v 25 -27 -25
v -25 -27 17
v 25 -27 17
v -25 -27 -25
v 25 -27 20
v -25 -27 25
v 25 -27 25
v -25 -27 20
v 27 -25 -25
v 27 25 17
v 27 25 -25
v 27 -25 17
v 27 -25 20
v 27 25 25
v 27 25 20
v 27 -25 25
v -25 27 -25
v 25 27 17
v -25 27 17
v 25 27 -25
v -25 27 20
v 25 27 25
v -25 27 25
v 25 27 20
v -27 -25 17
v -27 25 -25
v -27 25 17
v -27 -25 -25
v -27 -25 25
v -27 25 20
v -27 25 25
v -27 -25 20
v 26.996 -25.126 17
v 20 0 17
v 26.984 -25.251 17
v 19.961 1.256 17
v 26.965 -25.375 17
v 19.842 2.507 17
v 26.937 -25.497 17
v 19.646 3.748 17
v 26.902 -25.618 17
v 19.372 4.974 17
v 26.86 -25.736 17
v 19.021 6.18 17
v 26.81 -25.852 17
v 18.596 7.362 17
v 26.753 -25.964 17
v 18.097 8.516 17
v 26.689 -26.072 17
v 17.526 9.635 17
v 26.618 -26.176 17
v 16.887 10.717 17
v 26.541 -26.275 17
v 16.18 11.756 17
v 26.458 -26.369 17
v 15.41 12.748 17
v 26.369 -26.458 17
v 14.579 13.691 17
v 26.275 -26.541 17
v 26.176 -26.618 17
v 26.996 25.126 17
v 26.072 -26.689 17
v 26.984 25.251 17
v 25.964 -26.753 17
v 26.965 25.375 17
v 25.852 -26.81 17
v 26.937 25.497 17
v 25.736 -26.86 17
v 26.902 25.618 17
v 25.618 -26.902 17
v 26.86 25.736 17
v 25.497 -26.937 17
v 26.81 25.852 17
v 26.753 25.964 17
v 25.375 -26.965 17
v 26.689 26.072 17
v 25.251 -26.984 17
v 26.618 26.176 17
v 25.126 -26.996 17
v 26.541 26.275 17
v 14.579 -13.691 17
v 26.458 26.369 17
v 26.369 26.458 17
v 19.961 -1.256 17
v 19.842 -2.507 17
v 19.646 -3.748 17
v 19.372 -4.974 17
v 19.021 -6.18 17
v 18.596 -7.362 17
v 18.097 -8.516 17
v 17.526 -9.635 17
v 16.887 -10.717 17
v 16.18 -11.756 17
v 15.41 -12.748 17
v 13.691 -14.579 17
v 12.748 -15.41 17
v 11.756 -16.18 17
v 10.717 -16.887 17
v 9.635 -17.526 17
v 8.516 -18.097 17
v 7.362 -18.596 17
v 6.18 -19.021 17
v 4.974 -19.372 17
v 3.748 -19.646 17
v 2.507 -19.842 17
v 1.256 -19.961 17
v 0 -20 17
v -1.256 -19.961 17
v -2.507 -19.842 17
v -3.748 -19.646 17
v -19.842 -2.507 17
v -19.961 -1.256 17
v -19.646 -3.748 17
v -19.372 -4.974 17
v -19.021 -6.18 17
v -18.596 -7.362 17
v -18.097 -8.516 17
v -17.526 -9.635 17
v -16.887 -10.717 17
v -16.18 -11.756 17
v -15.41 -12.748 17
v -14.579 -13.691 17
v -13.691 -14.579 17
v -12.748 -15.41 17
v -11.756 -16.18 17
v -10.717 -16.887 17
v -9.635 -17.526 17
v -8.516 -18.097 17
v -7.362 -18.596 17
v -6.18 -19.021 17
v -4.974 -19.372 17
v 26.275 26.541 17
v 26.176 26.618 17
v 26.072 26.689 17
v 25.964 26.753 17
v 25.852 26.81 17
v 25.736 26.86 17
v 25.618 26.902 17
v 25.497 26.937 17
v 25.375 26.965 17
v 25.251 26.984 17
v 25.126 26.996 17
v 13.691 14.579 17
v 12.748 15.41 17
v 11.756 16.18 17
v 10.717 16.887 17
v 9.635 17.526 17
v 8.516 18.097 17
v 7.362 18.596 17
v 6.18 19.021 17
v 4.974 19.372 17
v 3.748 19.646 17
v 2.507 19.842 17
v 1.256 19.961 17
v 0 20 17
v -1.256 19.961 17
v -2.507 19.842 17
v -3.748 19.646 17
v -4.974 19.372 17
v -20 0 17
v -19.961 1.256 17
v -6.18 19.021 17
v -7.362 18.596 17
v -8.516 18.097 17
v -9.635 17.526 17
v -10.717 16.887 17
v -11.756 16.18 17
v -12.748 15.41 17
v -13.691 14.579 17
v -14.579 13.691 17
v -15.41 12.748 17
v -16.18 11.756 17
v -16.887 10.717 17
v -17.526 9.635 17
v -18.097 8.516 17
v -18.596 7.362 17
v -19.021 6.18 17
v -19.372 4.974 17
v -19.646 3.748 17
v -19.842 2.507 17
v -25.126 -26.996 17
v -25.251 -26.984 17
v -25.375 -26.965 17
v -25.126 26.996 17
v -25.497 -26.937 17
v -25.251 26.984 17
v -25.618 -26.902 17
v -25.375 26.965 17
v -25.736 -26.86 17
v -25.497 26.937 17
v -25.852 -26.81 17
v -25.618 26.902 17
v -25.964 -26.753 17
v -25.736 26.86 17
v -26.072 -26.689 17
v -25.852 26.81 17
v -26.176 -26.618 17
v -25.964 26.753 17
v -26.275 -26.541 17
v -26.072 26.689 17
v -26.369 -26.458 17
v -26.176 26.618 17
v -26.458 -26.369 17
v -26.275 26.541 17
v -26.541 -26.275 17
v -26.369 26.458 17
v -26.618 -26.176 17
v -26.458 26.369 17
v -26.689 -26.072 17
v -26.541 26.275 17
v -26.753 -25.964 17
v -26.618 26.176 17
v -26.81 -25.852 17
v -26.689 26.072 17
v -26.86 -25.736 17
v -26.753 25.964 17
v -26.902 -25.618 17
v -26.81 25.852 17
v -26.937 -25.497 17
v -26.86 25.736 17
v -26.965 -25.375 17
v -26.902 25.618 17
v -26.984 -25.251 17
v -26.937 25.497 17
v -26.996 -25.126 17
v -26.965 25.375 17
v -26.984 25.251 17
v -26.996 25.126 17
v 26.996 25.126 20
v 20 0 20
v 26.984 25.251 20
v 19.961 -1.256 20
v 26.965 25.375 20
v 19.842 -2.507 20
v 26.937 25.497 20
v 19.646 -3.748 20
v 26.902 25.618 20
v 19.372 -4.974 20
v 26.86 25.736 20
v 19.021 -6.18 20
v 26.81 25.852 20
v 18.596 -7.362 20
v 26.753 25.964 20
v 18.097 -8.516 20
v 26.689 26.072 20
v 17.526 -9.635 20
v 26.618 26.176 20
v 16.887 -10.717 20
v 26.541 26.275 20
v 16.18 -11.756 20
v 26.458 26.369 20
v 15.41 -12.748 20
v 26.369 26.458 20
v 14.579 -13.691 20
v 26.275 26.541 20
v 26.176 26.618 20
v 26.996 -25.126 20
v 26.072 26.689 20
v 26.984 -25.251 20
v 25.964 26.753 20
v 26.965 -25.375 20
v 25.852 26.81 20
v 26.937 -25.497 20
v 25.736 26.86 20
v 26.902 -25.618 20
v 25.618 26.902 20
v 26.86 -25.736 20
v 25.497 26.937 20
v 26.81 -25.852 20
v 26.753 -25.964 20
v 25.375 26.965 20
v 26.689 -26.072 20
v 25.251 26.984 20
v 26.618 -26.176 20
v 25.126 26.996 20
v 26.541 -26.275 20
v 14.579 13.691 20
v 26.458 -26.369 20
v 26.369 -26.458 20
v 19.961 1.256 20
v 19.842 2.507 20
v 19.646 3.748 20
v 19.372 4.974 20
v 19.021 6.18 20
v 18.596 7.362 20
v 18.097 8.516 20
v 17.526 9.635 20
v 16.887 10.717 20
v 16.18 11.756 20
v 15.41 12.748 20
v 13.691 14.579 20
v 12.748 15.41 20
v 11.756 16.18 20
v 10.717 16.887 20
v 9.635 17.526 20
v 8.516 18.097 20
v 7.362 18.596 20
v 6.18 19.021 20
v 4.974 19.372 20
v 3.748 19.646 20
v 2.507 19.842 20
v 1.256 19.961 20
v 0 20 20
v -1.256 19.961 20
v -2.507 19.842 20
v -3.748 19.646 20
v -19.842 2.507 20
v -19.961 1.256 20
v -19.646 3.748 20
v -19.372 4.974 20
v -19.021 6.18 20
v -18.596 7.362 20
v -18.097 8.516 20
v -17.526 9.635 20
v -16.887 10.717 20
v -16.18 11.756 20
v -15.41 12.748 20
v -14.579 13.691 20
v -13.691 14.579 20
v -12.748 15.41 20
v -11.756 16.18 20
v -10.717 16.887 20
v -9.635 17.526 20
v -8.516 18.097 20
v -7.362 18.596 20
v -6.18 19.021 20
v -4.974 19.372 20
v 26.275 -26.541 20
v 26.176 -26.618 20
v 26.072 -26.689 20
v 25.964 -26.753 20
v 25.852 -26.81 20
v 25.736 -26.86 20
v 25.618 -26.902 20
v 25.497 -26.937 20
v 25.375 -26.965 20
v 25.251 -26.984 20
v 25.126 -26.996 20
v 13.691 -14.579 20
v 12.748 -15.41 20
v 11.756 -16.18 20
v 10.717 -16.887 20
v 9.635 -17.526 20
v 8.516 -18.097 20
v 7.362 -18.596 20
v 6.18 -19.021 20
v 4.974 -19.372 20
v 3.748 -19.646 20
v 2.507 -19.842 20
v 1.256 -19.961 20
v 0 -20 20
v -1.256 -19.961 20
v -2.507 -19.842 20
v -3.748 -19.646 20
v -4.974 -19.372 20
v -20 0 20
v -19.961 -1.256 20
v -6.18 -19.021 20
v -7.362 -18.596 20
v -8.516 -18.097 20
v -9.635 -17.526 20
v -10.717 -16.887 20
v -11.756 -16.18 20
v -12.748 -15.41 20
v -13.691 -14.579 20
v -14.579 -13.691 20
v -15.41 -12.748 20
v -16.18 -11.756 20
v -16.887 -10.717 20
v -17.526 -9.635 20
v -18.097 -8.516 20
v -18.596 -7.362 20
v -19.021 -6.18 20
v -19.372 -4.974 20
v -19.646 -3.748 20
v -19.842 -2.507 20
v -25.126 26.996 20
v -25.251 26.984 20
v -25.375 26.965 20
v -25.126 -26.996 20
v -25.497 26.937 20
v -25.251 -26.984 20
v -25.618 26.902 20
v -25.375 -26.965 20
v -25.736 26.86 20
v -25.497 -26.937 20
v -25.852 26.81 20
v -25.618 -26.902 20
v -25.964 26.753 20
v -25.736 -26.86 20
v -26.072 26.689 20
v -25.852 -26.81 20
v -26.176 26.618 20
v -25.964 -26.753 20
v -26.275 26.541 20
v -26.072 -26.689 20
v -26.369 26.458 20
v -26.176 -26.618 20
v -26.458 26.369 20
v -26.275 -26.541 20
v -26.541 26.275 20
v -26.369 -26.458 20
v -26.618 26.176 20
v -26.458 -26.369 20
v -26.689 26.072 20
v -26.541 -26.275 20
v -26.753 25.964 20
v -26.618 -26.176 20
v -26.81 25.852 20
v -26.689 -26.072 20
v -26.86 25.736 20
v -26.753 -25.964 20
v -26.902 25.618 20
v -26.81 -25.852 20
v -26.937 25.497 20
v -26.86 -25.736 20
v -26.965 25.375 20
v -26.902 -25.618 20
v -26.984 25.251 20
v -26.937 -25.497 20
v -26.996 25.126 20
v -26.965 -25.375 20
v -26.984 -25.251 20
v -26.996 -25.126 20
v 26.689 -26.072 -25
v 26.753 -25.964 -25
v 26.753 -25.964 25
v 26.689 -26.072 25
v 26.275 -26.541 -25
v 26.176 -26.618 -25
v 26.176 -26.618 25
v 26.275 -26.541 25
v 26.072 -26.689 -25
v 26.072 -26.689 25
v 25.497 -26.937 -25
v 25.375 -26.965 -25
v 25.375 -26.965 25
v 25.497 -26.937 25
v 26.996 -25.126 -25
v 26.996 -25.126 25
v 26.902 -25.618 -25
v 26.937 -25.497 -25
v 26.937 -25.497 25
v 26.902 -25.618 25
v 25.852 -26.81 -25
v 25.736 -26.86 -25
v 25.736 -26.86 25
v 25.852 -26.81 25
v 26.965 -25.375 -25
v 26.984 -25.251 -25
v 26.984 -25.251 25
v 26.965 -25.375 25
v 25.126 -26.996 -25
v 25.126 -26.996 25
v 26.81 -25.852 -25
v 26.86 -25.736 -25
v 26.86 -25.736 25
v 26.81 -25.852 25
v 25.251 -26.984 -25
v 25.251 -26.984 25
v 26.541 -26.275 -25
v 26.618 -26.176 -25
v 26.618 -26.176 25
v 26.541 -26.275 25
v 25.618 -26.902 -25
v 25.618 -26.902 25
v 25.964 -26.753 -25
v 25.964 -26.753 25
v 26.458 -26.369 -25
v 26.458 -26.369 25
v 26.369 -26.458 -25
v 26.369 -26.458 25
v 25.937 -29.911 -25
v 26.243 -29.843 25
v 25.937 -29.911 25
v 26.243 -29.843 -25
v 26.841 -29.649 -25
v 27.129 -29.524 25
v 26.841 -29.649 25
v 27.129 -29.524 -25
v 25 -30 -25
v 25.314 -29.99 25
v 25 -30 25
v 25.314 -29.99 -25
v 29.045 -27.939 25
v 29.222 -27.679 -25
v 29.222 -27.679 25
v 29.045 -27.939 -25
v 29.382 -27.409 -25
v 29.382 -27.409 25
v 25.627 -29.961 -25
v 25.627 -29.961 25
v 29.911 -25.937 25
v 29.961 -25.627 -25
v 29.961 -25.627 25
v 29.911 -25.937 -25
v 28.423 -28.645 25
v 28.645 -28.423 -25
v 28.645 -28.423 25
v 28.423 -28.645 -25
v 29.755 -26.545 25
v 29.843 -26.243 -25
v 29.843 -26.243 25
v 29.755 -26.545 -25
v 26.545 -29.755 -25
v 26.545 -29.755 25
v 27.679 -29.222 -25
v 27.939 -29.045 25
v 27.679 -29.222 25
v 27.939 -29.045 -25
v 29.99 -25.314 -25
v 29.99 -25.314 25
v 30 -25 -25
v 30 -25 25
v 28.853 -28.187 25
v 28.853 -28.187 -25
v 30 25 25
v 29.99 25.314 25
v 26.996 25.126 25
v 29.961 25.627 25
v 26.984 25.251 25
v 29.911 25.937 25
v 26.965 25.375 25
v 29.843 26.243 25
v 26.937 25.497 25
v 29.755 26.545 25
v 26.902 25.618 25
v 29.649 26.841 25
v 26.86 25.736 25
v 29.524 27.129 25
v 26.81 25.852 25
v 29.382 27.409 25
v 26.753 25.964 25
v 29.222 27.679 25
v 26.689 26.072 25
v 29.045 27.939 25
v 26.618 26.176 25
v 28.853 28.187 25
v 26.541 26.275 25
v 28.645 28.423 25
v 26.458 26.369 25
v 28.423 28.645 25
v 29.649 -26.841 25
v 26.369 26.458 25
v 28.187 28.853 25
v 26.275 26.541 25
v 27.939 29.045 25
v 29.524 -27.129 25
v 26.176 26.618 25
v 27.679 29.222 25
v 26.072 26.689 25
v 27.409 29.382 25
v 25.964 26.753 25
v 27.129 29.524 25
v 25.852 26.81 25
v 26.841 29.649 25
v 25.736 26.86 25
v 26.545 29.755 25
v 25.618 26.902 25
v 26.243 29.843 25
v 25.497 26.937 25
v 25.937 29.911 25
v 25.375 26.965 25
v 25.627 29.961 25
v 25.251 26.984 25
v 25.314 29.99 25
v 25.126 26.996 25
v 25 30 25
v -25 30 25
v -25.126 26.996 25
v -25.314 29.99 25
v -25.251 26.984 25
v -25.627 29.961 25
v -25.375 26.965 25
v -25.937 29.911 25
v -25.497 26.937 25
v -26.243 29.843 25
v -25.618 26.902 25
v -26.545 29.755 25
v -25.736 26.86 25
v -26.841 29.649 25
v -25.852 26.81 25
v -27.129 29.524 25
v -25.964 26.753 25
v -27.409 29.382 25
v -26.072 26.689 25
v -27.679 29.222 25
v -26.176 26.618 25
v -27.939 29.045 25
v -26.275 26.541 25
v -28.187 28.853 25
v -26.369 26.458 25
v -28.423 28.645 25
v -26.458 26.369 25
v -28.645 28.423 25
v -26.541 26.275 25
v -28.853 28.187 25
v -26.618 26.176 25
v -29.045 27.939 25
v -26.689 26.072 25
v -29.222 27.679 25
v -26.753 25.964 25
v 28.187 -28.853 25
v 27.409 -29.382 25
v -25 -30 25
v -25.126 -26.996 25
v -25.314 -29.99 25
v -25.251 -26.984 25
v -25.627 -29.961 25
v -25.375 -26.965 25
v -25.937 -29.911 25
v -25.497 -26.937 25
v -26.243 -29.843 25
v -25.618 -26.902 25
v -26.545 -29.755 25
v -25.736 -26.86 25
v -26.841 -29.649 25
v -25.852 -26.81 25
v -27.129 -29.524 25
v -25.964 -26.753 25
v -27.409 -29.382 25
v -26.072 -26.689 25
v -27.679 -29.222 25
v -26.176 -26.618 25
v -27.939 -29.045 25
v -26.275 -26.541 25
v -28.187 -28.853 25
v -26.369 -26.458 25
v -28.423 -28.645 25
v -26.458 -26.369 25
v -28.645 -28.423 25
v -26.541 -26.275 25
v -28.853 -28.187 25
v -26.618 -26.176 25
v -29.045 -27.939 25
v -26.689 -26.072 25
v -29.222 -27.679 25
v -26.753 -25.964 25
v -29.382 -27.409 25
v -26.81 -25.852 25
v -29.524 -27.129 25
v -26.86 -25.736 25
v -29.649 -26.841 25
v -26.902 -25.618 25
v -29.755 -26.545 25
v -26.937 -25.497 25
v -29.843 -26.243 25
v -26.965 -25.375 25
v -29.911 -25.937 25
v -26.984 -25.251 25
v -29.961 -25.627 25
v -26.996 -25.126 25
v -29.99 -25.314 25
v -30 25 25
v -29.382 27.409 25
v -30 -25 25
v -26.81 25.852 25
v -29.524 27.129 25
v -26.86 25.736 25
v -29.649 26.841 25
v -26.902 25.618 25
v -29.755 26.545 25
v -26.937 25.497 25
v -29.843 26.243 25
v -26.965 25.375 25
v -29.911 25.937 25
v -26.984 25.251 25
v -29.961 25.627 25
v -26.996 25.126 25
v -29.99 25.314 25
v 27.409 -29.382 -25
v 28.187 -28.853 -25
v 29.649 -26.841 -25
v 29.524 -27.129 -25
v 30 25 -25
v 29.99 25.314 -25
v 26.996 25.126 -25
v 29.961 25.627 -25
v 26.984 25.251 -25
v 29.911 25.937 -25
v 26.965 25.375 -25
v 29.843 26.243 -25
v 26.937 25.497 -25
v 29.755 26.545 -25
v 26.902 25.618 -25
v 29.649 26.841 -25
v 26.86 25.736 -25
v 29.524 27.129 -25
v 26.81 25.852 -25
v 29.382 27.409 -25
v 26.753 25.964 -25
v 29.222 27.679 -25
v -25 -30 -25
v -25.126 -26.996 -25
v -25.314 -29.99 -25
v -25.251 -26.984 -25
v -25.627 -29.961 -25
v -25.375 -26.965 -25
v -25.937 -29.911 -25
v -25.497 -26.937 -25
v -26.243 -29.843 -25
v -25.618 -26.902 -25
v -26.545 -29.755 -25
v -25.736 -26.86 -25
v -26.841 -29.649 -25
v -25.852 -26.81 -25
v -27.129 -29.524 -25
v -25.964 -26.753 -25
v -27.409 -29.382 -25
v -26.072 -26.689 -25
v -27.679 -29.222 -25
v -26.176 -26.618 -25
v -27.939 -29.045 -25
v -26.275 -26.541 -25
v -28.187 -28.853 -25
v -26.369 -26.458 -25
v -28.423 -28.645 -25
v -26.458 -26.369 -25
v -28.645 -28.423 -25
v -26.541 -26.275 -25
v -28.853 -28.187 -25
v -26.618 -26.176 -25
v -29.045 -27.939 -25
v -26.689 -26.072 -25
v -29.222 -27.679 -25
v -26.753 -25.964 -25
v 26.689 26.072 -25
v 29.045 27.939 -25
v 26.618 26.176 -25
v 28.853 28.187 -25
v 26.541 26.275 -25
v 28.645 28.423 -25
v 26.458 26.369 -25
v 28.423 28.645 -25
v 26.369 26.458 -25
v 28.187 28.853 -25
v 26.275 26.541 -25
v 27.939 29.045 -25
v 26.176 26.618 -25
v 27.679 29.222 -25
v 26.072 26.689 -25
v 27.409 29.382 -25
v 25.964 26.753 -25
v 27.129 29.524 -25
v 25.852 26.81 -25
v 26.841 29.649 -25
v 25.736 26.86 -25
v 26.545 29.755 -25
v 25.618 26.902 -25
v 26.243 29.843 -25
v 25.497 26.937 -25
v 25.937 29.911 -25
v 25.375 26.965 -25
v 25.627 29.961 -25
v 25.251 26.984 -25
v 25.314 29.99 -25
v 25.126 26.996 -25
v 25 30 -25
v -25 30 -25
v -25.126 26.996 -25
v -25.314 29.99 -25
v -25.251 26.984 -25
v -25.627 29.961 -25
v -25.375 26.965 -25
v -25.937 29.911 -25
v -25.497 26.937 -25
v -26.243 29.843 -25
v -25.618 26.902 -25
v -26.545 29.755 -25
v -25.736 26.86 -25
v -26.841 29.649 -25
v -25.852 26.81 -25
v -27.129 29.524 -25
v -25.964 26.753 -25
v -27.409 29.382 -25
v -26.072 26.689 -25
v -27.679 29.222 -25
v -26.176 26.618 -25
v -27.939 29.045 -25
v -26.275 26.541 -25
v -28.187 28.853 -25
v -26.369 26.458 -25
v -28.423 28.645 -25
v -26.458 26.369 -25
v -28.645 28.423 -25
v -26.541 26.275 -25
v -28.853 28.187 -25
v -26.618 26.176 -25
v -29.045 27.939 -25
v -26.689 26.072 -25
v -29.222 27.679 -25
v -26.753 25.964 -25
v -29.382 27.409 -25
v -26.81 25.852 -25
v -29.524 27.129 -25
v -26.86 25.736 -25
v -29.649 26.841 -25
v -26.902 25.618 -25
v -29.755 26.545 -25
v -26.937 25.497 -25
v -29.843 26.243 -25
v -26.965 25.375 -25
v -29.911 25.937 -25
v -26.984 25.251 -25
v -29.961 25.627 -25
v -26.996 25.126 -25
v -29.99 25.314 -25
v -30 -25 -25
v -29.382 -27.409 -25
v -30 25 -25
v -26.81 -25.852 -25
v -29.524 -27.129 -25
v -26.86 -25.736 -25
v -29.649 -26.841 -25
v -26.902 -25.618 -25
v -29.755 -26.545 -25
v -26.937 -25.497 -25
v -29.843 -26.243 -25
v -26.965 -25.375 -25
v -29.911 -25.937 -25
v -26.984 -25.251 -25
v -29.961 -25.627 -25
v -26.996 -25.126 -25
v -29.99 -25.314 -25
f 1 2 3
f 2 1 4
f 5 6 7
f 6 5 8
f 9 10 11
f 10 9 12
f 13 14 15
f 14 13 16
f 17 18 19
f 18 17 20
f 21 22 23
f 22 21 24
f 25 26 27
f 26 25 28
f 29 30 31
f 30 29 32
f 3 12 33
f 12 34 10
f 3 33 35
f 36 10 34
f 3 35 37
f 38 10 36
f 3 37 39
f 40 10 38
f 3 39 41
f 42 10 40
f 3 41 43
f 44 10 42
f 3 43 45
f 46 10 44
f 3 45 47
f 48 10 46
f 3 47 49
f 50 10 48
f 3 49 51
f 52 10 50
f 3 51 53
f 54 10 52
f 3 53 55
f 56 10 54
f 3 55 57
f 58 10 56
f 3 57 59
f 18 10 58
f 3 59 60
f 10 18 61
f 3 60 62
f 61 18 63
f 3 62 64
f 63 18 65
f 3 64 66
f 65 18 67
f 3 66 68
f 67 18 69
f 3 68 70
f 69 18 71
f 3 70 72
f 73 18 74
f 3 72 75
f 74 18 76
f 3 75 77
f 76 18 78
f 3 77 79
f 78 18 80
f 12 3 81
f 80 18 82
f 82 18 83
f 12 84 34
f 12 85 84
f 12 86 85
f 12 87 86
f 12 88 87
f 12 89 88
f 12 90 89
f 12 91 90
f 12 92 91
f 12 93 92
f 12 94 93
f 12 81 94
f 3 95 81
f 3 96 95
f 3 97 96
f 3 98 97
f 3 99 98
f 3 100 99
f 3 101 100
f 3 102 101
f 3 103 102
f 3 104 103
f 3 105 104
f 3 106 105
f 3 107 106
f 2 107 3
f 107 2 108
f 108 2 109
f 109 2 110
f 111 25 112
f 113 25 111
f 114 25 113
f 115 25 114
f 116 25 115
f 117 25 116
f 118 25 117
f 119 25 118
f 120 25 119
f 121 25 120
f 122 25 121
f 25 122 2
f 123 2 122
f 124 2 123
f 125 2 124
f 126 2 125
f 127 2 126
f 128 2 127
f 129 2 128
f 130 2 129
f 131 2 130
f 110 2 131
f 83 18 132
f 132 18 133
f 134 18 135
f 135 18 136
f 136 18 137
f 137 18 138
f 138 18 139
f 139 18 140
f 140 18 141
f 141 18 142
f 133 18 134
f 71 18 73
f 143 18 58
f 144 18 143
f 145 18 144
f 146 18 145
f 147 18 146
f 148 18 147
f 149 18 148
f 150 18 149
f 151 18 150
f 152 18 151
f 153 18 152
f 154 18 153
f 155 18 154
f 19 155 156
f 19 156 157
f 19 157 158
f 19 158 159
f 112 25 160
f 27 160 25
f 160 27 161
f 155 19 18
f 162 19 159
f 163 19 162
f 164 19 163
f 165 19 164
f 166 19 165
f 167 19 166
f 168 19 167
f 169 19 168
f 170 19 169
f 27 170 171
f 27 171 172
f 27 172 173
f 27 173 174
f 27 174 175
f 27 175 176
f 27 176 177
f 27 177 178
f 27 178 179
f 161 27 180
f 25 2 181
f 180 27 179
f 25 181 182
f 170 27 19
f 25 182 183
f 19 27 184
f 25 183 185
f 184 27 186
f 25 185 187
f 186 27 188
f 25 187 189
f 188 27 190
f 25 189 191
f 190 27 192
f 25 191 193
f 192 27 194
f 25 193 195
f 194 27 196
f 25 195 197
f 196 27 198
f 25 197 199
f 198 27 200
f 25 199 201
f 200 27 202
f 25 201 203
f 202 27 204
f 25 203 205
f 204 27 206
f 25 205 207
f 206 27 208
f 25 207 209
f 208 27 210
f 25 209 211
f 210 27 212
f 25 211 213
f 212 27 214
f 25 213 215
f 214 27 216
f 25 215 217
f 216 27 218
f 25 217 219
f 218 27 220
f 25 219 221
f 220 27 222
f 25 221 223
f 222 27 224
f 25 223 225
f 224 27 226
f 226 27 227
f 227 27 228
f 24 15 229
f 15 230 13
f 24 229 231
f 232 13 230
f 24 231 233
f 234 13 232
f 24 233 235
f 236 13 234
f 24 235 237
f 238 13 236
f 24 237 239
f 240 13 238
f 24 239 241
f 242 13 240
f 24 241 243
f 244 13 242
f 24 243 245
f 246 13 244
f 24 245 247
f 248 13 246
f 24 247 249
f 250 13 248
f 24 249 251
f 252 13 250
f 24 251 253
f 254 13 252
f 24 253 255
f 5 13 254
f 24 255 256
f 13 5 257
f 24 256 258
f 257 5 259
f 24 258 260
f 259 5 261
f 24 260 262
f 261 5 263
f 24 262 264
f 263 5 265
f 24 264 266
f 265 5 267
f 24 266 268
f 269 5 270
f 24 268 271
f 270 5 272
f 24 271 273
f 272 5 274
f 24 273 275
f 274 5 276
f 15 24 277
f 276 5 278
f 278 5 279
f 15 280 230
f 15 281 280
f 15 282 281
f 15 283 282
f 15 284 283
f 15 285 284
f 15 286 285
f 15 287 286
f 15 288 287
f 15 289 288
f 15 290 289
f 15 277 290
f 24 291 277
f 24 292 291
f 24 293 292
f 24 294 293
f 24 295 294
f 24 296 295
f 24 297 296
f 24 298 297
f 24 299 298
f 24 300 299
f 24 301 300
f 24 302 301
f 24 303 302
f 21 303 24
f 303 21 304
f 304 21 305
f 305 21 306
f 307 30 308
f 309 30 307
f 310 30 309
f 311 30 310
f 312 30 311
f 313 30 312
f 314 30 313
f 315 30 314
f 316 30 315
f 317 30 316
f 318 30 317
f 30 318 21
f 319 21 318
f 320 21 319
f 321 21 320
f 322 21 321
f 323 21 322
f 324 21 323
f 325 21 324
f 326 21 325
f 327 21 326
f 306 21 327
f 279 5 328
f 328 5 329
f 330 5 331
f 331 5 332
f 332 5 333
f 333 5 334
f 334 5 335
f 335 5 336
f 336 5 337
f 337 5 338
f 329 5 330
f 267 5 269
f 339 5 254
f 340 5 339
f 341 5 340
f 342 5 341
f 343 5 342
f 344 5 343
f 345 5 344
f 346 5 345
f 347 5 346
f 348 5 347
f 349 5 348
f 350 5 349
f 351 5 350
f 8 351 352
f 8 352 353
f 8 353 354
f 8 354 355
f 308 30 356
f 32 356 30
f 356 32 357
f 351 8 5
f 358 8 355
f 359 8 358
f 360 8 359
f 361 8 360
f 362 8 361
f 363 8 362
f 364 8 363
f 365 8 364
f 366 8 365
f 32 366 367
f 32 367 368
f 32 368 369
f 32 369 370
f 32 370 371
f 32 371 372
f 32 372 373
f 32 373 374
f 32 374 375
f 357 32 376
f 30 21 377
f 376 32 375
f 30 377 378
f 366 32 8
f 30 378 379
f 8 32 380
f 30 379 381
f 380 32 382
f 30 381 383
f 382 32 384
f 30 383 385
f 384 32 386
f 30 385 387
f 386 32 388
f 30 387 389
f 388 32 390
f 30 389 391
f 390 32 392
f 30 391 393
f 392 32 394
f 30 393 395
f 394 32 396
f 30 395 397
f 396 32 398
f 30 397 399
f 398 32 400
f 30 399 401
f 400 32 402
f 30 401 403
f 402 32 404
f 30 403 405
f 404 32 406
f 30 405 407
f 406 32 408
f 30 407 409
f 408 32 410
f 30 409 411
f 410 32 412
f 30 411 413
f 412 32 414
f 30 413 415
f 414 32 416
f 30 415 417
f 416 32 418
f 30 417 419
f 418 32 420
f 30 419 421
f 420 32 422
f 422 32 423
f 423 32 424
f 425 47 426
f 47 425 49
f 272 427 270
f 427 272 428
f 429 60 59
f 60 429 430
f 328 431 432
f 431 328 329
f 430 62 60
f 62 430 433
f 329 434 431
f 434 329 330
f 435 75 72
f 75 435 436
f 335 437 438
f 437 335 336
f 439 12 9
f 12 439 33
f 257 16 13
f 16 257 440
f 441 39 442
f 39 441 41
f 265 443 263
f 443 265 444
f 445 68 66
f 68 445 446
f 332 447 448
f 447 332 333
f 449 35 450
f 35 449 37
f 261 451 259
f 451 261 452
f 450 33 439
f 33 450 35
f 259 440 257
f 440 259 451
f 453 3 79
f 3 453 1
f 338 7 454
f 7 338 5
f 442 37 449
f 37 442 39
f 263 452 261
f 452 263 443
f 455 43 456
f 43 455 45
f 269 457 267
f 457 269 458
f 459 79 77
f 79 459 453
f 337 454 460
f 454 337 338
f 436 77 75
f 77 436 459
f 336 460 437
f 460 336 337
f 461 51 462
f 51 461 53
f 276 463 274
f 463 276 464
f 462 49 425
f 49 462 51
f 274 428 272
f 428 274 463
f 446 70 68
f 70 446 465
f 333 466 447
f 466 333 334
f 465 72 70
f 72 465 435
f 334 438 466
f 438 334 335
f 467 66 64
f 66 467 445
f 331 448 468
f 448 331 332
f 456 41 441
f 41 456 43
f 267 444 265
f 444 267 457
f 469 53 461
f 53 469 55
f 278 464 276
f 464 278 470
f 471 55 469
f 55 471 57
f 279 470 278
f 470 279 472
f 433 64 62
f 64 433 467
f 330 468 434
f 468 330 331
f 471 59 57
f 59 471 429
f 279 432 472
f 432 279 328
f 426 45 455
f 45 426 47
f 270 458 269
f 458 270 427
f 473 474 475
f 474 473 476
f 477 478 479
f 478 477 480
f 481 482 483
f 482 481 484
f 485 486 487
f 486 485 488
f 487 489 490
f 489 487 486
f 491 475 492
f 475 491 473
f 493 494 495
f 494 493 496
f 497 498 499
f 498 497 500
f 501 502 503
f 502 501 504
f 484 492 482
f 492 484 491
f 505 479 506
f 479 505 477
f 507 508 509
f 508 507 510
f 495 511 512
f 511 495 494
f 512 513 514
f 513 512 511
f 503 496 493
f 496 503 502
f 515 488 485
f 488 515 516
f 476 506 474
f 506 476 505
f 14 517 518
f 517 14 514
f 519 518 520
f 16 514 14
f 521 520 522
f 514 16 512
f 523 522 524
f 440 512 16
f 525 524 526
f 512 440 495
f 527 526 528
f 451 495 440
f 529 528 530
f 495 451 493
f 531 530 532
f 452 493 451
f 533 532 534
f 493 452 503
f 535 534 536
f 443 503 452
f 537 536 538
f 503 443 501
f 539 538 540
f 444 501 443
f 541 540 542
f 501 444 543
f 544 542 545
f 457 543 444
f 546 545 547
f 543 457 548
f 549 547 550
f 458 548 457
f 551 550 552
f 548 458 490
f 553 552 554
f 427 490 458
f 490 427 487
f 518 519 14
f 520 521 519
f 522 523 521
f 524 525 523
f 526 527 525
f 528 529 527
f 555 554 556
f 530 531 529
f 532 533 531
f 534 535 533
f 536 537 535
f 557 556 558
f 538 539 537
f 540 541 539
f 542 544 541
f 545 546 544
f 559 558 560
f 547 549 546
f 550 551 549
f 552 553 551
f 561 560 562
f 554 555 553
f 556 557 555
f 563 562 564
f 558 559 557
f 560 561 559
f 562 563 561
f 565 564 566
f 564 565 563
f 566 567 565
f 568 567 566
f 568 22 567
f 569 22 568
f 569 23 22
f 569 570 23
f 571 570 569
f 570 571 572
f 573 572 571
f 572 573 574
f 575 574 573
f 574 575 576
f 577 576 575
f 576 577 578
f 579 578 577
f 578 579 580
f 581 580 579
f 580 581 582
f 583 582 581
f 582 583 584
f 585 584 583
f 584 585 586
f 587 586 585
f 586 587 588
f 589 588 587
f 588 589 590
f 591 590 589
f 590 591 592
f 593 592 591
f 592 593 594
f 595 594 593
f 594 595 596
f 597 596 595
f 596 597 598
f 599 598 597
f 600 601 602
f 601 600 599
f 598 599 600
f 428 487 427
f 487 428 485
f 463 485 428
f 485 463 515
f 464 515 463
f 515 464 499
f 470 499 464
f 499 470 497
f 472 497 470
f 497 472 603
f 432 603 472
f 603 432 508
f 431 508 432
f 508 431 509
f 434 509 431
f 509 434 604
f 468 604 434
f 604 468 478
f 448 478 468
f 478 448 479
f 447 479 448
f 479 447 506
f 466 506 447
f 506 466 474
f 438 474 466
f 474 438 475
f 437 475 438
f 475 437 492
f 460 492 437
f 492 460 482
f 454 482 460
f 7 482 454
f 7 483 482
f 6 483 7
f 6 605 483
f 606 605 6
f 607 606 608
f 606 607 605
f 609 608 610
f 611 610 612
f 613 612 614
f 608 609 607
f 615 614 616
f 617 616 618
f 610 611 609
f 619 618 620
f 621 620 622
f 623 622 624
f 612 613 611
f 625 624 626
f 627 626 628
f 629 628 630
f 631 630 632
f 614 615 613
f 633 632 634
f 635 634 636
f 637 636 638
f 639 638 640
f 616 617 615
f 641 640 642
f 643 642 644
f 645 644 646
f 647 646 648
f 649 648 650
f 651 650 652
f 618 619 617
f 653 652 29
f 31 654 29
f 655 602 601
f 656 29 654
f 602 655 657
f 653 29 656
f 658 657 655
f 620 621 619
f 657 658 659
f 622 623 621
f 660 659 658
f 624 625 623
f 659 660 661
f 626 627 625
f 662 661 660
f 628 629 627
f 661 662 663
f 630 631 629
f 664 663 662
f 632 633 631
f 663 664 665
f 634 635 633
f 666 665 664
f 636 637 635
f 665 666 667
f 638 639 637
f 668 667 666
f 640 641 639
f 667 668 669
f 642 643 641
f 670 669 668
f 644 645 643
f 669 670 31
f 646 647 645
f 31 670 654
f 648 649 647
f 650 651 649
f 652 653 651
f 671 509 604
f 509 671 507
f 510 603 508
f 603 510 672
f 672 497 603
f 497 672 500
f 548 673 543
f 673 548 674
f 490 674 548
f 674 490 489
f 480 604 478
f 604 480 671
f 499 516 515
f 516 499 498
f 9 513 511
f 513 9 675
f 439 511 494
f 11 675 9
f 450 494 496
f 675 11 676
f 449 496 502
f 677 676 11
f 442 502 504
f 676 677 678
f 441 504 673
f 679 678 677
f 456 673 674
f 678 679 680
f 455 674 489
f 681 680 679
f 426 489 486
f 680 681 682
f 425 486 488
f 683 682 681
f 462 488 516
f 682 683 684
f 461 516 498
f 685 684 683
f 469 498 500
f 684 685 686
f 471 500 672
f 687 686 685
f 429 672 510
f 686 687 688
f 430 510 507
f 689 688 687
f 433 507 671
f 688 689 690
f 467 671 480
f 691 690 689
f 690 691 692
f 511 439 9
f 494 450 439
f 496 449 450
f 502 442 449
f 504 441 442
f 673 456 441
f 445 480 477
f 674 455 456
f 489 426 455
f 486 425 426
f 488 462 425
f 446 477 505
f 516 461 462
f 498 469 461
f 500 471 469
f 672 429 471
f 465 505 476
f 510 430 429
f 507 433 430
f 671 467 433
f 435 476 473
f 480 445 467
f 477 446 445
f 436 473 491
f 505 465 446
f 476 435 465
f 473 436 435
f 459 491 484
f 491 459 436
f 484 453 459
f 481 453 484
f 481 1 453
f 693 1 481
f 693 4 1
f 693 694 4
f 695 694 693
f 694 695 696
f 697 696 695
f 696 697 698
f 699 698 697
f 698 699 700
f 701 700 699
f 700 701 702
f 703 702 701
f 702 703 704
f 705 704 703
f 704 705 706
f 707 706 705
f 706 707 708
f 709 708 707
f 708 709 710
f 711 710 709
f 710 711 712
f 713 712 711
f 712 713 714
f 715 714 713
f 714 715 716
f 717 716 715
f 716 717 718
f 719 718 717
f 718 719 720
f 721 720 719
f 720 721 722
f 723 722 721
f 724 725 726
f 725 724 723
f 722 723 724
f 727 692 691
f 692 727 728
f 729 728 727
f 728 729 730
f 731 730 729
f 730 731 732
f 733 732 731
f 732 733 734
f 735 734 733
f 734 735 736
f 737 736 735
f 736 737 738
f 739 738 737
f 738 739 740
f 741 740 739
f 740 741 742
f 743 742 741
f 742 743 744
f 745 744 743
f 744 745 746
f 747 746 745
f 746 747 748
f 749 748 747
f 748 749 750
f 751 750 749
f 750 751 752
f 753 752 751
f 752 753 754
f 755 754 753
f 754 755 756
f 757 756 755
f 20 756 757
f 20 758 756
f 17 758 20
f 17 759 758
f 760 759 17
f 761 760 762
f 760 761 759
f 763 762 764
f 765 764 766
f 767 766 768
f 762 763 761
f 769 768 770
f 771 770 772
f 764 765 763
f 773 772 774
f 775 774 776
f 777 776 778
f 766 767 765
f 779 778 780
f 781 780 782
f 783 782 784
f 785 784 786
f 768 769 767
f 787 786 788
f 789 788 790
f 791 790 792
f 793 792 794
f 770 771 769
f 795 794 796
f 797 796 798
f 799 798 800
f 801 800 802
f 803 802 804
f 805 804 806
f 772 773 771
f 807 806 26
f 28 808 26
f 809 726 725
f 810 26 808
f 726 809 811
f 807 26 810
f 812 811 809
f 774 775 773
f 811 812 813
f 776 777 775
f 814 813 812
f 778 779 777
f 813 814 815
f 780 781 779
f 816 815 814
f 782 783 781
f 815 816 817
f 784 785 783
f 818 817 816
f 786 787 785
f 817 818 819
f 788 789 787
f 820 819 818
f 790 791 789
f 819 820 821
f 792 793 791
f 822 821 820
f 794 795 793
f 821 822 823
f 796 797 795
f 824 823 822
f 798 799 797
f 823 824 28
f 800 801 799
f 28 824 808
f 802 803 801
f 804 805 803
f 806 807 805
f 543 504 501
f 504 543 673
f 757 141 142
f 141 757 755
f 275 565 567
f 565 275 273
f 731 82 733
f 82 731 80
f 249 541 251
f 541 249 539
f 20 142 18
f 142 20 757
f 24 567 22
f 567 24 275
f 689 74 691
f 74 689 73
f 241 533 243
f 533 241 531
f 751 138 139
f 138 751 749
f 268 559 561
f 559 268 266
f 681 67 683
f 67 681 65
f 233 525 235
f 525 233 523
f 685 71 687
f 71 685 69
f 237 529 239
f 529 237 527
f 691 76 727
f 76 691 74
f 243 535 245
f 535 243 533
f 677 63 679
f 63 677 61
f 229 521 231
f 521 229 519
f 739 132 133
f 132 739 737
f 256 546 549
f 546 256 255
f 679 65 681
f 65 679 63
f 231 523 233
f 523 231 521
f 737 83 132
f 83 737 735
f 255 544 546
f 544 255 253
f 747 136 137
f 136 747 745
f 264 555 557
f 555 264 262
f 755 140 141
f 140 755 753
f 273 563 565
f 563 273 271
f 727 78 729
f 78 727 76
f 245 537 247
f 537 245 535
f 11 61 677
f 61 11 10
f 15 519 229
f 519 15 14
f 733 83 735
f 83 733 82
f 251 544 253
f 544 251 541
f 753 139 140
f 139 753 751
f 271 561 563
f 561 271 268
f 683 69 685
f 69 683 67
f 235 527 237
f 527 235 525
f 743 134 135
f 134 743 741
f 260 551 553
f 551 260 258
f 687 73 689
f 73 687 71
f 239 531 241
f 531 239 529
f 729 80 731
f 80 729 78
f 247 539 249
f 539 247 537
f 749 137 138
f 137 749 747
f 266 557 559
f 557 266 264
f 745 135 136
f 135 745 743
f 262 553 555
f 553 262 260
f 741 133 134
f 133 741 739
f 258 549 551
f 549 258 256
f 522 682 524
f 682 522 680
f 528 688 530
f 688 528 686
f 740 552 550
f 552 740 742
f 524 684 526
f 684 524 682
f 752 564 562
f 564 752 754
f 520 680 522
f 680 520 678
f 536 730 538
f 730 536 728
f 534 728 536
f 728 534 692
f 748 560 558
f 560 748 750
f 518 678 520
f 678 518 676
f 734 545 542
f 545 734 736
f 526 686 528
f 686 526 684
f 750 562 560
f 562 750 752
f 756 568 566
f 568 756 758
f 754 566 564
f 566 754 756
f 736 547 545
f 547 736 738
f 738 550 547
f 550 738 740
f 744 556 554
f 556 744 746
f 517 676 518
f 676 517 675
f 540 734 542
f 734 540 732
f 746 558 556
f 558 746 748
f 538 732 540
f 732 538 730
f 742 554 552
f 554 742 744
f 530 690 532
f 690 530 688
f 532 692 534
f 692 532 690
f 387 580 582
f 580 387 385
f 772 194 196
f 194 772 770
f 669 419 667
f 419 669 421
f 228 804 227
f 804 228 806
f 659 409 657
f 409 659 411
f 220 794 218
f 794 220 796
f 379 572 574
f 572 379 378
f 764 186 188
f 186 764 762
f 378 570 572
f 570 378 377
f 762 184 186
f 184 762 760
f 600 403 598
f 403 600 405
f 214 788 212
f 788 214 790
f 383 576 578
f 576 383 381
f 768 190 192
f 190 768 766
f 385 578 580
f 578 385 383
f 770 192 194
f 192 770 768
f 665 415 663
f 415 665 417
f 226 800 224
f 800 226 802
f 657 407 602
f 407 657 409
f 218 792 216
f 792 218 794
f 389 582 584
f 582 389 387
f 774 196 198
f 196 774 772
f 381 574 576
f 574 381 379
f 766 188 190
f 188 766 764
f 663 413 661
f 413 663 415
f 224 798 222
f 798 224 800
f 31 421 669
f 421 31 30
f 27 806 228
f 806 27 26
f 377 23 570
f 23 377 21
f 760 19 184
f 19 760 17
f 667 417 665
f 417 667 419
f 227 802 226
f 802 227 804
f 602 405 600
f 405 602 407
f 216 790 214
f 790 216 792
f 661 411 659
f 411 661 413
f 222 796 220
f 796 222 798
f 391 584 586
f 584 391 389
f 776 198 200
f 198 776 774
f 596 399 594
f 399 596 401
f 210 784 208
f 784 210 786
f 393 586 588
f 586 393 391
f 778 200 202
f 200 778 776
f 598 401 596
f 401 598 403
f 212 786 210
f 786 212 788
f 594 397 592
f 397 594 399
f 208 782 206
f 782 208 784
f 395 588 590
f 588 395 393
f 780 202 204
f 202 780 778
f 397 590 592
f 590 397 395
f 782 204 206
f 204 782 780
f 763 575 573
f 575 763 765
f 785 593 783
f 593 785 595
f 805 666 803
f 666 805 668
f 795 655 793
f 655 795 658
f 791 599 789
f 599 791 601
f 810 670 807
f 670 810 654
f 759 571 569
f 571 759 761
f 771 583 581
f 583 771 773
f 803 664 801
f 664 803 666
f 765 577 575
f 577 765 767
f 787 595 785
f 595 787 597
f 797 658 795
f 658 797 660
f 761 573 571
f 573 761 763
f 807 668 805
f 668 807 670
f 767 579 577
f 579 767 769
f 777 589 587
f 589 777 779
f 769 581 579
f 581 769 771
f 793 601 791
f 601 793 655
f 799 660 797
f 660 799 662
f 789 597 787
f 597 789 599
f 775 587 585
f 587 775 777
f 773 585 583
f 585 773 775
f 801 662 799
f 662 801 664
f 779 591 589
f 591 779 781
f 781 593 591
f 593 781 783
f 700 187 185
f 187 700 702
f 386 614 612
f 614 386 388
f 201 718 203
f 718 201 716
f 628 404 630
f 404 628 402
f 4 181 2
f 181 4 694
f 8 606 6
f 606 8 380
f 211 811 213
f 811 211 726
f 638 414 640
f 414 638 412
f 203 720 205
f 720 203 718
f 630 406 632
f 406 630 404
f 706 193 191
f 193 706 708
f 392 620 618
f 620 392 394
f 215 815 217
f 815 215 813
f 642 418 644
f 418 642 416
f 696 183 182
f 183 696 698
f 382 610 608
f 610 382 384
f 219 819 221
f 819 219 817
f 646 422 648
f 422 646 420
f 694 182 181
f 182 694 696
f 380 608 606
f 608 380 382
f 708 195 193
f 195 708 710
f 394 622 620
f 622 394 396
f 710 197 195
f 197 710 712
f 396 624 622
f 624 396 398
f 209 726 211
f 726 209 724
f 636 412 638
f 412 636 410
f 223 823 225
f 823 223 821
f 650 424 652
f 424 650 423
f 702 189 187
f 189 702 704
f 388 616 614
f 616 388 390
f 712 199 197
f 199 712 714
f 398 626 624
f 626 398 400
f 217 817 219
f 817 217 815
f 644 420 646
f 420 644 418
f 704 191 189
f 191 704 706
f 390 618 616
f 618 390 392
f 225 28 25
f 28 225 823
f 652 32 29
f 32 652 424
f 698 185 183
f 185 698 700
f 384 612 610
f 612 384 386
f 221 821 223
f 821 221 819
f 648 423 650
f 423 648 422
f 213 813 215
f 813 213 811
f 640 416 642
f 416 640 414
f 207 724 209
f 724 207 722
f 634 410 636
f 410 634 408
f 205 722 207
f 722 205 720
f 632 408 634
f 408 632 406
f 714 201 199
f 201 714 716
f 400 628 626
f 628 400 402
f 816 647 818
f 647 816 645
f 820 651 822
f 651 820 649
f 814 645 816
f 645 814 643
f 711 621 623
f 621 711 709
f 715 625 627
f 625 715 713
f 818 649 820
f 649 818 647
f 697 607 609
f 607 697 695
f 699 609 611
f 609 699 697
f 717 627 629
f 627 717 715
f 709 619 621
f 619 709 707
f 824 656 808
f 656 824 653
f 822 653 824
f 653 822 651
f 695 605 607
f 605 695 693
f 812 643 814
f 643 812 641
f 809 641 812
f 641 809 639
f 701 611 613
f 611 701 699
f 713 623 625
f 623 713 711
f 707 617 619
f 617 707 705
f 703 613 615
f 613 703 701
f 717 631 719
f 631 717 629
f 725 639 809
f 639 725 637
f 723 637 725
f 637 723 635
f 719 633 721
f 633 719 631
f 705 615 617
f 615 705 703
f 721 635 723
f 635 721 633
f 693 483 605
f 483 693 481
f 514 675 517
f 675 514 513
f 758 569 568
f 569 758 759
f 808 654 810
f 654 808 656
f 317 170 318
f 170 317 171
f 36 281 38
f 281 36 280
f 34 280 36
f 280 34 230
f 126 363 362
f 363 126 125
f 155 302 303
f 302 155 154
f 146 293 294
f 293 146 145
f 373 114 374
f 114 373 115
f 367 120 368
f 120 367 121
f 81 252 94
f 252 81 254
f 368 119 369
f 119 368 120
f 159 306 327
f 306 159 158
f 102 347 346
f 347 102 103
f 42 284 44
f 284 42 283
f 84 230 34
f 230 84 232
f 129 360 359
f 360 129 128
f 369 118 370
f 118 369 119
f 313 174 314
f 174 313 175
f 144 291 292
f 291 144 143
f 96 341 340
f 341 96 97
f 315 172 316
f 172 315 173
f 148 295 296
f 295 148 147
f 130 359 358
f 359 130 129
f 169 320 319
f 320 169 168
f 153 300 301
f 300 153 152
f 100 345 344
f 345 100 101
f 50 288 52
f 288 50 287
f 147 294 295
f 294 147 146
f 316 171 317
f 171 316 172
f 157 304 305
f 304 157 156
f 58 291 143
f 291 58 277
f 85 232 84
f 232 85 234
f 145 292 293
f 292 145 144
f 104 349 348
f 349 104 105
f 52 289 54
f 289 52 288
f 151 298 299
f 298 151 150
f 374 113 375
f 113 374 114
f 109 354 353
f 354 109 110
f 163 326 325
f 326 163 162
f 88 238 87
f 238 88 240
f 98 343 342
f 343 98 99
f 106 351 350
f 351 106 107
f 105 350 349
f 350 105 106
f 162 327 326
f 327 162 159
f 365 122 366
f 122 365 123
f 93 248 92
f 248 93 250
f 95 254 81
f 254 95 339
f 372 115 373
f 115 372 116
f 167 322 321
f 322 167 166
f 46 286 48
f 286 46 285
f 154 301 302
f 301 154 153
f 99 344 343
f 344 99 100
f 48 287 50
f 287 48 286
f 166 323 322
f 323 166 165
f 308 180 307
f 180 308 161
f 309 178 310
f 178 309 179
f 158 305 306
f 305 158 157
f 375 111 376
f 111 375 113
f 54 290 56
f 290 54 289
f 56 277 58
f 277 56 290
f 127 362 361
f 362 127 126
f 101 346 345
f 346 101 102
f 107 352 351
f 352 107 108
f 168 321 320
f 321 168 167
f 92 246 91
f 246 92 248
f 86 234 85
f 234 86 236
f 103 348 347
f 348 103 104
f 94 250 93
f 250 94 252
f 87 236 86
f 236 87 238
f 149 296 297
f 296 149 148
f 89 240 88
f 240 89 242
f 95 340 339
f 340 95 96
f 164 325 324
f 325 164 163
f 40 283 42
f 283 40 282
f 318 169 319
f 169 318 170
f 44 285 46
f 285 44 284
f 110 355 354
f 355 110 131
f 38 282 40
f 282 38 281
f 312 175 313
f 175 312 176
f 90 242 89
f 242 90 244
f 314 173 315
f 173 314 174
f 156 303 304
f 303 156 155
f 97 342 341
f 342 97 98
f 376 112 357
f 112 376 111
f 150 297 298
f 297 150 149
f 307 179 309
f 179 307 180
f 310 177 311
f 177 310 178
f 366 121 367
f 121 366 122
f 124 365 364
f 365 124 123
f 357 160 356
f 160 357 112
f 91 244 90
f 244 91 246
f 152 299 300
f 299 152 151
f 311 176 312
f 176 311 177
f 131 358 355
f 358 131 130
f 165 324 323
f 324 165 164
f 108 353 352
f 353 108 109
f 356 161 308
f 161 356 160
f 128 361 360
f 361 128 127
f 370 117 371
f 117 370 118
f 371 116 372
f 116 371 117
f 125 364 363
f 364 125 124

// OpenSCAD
// [FL_INDEX: keywords="openscad, 3d_parametric, Microphone_Flag, csg_solid" | COT="Parametric OpenSCAD design from 3DCodeverse"]
// Title: Microphone Flag

//CUSTOMIZER VARIABLES

//	Number of sides for the Microphone flag
number_of_sides = 4;	//	[3:12]

//	This is the width of the logo area, margin for the rounding will be added (mm)
width_of_logo = 50;

//	This is the height of the logo area (mm)
height_of_logo = 50;

//	This is the diameter of the hole for the microphone (mm)
hole_diameter = 40;

//	Here you can select if you want a bottom plate too, or just the top one
use_bottom = "false";	//	[true,false]

//CUSTOMIZER VARIABLES END

resolution = 100*1;

module flag(size, height, sides, hole, bottom)
{
	difference()
	{
		union()
		{
			difference()
			{
				union()
				{
					translate([0, 0, height/2-3/2-5])
						cylinder(h = 3, r1 = sqrt((tan((90+((sides-3)*90))/sides)*size/2)*(tan((90+((sides-3)*90))/sides)*size/2)+(size/2)*(size/2))+4, r2 = sqrt((tan((90+((sides-3)*90))/sides)*size/2)*(tan((90+((sides-3)*90))/sides)*size/2)+(size/2)*(size/2))+4, center = true, $fn = resolution);
					if (bottom == "true")
					{
						translate([0, 0, -height/2+3/2])
							cylinder(h = 3, r1 = sqrt((tan((90+((sides-3)*90))/sides)*size/2)*(tan((90+((sides-3)*90))/sides)*size/2)+(size/2)*(size/2))+4, r2 = sqrt((tan((90+((sides-3)*90))/sides)*size/2)*(tan((90+((sides-3)*90))/sides)*size/2)+(size/2)*(size/2))+4, center = true, $fn = resolution);
					}
				}
				union()
				{
					for ( i = [0 : sides-1] )
					{		
						rotate(360/sides*i, [0, 0, 1])
						translate([0, -(tan((90+((sides-3)*90))/sides)*size/2)-2-30/2, 0]) //distance from center
							cube([size+10, 30, height], center = true); // side block

					}
				}
			}
			for ( i = [0 : sides-1] )
			{		
				rotate(360/sides*i, [0, 0, 1])
				translate([0, -(tan((90+((sides-3)*90))/sides)*size/2)-5+3/2, 0]) //distance from center
					cube([size, 3, height], center = true); // side

				difference()
				{
					union()
					{
						rotate(360/sides*i, [0, 0, 1]) // follow sides
						translate([size/2, -(tan((90+((sides-3)*90))/sides)*size/2), 0]) // move to end of side
							cylinder(h = height, r1 = 5, r2 = 5, center = true, $fn = resolution); // outer corner diameter
					}
					union()
					{
						rotate(360/sides*i, [0, 0, 1]) // follow sides
						translate([size/2, -(tan((90+((sides-3)*90))/sides)*size/2), 0]) // move to end of side
							cylinder(h = height+1, r1 = 2, r2 = 2, center = true, $fn = resolution); // inner corner diameter		

						rotate(360/sides*i, [0, 0, 1]) // follow sides
						translate([size/2-10, -(tan((90+((sides-3)*90))/sides)*size/2), 0]) // move to end of side
							cube([20, 20, height+1], center = true);

						rotate(360/sides*i, [0, 0, 1])
						translate([size/2, -(tan((90+((sides-3)*90))/sides)*size/2), 0])
						rotate(360/sides+180, [0, 0, 1])
						translate([-10, 0, 0])
							cube([20, 20, height+1], center = true);
					}
				}
			}
		}
		union()
		{
			cylinder(h = height+1, r = hole/2, center = true, $fn = resolution);
		}
	}
}

// called with customizer parameters
flag(width_of_logo, height_of_logo, number_of_sides, hole_diameter, use_bottom);

//flag(90, 40, 3, 40, "false");

//flag(60, 65, 4, 40, "false");

//flag(45, 30, 5, 40, "false");

//flag(40, 40, 6, 40, "false");

//flag(30, 35, 7, 40, "false");

//flag(45, 45, 4, 35, "true");
